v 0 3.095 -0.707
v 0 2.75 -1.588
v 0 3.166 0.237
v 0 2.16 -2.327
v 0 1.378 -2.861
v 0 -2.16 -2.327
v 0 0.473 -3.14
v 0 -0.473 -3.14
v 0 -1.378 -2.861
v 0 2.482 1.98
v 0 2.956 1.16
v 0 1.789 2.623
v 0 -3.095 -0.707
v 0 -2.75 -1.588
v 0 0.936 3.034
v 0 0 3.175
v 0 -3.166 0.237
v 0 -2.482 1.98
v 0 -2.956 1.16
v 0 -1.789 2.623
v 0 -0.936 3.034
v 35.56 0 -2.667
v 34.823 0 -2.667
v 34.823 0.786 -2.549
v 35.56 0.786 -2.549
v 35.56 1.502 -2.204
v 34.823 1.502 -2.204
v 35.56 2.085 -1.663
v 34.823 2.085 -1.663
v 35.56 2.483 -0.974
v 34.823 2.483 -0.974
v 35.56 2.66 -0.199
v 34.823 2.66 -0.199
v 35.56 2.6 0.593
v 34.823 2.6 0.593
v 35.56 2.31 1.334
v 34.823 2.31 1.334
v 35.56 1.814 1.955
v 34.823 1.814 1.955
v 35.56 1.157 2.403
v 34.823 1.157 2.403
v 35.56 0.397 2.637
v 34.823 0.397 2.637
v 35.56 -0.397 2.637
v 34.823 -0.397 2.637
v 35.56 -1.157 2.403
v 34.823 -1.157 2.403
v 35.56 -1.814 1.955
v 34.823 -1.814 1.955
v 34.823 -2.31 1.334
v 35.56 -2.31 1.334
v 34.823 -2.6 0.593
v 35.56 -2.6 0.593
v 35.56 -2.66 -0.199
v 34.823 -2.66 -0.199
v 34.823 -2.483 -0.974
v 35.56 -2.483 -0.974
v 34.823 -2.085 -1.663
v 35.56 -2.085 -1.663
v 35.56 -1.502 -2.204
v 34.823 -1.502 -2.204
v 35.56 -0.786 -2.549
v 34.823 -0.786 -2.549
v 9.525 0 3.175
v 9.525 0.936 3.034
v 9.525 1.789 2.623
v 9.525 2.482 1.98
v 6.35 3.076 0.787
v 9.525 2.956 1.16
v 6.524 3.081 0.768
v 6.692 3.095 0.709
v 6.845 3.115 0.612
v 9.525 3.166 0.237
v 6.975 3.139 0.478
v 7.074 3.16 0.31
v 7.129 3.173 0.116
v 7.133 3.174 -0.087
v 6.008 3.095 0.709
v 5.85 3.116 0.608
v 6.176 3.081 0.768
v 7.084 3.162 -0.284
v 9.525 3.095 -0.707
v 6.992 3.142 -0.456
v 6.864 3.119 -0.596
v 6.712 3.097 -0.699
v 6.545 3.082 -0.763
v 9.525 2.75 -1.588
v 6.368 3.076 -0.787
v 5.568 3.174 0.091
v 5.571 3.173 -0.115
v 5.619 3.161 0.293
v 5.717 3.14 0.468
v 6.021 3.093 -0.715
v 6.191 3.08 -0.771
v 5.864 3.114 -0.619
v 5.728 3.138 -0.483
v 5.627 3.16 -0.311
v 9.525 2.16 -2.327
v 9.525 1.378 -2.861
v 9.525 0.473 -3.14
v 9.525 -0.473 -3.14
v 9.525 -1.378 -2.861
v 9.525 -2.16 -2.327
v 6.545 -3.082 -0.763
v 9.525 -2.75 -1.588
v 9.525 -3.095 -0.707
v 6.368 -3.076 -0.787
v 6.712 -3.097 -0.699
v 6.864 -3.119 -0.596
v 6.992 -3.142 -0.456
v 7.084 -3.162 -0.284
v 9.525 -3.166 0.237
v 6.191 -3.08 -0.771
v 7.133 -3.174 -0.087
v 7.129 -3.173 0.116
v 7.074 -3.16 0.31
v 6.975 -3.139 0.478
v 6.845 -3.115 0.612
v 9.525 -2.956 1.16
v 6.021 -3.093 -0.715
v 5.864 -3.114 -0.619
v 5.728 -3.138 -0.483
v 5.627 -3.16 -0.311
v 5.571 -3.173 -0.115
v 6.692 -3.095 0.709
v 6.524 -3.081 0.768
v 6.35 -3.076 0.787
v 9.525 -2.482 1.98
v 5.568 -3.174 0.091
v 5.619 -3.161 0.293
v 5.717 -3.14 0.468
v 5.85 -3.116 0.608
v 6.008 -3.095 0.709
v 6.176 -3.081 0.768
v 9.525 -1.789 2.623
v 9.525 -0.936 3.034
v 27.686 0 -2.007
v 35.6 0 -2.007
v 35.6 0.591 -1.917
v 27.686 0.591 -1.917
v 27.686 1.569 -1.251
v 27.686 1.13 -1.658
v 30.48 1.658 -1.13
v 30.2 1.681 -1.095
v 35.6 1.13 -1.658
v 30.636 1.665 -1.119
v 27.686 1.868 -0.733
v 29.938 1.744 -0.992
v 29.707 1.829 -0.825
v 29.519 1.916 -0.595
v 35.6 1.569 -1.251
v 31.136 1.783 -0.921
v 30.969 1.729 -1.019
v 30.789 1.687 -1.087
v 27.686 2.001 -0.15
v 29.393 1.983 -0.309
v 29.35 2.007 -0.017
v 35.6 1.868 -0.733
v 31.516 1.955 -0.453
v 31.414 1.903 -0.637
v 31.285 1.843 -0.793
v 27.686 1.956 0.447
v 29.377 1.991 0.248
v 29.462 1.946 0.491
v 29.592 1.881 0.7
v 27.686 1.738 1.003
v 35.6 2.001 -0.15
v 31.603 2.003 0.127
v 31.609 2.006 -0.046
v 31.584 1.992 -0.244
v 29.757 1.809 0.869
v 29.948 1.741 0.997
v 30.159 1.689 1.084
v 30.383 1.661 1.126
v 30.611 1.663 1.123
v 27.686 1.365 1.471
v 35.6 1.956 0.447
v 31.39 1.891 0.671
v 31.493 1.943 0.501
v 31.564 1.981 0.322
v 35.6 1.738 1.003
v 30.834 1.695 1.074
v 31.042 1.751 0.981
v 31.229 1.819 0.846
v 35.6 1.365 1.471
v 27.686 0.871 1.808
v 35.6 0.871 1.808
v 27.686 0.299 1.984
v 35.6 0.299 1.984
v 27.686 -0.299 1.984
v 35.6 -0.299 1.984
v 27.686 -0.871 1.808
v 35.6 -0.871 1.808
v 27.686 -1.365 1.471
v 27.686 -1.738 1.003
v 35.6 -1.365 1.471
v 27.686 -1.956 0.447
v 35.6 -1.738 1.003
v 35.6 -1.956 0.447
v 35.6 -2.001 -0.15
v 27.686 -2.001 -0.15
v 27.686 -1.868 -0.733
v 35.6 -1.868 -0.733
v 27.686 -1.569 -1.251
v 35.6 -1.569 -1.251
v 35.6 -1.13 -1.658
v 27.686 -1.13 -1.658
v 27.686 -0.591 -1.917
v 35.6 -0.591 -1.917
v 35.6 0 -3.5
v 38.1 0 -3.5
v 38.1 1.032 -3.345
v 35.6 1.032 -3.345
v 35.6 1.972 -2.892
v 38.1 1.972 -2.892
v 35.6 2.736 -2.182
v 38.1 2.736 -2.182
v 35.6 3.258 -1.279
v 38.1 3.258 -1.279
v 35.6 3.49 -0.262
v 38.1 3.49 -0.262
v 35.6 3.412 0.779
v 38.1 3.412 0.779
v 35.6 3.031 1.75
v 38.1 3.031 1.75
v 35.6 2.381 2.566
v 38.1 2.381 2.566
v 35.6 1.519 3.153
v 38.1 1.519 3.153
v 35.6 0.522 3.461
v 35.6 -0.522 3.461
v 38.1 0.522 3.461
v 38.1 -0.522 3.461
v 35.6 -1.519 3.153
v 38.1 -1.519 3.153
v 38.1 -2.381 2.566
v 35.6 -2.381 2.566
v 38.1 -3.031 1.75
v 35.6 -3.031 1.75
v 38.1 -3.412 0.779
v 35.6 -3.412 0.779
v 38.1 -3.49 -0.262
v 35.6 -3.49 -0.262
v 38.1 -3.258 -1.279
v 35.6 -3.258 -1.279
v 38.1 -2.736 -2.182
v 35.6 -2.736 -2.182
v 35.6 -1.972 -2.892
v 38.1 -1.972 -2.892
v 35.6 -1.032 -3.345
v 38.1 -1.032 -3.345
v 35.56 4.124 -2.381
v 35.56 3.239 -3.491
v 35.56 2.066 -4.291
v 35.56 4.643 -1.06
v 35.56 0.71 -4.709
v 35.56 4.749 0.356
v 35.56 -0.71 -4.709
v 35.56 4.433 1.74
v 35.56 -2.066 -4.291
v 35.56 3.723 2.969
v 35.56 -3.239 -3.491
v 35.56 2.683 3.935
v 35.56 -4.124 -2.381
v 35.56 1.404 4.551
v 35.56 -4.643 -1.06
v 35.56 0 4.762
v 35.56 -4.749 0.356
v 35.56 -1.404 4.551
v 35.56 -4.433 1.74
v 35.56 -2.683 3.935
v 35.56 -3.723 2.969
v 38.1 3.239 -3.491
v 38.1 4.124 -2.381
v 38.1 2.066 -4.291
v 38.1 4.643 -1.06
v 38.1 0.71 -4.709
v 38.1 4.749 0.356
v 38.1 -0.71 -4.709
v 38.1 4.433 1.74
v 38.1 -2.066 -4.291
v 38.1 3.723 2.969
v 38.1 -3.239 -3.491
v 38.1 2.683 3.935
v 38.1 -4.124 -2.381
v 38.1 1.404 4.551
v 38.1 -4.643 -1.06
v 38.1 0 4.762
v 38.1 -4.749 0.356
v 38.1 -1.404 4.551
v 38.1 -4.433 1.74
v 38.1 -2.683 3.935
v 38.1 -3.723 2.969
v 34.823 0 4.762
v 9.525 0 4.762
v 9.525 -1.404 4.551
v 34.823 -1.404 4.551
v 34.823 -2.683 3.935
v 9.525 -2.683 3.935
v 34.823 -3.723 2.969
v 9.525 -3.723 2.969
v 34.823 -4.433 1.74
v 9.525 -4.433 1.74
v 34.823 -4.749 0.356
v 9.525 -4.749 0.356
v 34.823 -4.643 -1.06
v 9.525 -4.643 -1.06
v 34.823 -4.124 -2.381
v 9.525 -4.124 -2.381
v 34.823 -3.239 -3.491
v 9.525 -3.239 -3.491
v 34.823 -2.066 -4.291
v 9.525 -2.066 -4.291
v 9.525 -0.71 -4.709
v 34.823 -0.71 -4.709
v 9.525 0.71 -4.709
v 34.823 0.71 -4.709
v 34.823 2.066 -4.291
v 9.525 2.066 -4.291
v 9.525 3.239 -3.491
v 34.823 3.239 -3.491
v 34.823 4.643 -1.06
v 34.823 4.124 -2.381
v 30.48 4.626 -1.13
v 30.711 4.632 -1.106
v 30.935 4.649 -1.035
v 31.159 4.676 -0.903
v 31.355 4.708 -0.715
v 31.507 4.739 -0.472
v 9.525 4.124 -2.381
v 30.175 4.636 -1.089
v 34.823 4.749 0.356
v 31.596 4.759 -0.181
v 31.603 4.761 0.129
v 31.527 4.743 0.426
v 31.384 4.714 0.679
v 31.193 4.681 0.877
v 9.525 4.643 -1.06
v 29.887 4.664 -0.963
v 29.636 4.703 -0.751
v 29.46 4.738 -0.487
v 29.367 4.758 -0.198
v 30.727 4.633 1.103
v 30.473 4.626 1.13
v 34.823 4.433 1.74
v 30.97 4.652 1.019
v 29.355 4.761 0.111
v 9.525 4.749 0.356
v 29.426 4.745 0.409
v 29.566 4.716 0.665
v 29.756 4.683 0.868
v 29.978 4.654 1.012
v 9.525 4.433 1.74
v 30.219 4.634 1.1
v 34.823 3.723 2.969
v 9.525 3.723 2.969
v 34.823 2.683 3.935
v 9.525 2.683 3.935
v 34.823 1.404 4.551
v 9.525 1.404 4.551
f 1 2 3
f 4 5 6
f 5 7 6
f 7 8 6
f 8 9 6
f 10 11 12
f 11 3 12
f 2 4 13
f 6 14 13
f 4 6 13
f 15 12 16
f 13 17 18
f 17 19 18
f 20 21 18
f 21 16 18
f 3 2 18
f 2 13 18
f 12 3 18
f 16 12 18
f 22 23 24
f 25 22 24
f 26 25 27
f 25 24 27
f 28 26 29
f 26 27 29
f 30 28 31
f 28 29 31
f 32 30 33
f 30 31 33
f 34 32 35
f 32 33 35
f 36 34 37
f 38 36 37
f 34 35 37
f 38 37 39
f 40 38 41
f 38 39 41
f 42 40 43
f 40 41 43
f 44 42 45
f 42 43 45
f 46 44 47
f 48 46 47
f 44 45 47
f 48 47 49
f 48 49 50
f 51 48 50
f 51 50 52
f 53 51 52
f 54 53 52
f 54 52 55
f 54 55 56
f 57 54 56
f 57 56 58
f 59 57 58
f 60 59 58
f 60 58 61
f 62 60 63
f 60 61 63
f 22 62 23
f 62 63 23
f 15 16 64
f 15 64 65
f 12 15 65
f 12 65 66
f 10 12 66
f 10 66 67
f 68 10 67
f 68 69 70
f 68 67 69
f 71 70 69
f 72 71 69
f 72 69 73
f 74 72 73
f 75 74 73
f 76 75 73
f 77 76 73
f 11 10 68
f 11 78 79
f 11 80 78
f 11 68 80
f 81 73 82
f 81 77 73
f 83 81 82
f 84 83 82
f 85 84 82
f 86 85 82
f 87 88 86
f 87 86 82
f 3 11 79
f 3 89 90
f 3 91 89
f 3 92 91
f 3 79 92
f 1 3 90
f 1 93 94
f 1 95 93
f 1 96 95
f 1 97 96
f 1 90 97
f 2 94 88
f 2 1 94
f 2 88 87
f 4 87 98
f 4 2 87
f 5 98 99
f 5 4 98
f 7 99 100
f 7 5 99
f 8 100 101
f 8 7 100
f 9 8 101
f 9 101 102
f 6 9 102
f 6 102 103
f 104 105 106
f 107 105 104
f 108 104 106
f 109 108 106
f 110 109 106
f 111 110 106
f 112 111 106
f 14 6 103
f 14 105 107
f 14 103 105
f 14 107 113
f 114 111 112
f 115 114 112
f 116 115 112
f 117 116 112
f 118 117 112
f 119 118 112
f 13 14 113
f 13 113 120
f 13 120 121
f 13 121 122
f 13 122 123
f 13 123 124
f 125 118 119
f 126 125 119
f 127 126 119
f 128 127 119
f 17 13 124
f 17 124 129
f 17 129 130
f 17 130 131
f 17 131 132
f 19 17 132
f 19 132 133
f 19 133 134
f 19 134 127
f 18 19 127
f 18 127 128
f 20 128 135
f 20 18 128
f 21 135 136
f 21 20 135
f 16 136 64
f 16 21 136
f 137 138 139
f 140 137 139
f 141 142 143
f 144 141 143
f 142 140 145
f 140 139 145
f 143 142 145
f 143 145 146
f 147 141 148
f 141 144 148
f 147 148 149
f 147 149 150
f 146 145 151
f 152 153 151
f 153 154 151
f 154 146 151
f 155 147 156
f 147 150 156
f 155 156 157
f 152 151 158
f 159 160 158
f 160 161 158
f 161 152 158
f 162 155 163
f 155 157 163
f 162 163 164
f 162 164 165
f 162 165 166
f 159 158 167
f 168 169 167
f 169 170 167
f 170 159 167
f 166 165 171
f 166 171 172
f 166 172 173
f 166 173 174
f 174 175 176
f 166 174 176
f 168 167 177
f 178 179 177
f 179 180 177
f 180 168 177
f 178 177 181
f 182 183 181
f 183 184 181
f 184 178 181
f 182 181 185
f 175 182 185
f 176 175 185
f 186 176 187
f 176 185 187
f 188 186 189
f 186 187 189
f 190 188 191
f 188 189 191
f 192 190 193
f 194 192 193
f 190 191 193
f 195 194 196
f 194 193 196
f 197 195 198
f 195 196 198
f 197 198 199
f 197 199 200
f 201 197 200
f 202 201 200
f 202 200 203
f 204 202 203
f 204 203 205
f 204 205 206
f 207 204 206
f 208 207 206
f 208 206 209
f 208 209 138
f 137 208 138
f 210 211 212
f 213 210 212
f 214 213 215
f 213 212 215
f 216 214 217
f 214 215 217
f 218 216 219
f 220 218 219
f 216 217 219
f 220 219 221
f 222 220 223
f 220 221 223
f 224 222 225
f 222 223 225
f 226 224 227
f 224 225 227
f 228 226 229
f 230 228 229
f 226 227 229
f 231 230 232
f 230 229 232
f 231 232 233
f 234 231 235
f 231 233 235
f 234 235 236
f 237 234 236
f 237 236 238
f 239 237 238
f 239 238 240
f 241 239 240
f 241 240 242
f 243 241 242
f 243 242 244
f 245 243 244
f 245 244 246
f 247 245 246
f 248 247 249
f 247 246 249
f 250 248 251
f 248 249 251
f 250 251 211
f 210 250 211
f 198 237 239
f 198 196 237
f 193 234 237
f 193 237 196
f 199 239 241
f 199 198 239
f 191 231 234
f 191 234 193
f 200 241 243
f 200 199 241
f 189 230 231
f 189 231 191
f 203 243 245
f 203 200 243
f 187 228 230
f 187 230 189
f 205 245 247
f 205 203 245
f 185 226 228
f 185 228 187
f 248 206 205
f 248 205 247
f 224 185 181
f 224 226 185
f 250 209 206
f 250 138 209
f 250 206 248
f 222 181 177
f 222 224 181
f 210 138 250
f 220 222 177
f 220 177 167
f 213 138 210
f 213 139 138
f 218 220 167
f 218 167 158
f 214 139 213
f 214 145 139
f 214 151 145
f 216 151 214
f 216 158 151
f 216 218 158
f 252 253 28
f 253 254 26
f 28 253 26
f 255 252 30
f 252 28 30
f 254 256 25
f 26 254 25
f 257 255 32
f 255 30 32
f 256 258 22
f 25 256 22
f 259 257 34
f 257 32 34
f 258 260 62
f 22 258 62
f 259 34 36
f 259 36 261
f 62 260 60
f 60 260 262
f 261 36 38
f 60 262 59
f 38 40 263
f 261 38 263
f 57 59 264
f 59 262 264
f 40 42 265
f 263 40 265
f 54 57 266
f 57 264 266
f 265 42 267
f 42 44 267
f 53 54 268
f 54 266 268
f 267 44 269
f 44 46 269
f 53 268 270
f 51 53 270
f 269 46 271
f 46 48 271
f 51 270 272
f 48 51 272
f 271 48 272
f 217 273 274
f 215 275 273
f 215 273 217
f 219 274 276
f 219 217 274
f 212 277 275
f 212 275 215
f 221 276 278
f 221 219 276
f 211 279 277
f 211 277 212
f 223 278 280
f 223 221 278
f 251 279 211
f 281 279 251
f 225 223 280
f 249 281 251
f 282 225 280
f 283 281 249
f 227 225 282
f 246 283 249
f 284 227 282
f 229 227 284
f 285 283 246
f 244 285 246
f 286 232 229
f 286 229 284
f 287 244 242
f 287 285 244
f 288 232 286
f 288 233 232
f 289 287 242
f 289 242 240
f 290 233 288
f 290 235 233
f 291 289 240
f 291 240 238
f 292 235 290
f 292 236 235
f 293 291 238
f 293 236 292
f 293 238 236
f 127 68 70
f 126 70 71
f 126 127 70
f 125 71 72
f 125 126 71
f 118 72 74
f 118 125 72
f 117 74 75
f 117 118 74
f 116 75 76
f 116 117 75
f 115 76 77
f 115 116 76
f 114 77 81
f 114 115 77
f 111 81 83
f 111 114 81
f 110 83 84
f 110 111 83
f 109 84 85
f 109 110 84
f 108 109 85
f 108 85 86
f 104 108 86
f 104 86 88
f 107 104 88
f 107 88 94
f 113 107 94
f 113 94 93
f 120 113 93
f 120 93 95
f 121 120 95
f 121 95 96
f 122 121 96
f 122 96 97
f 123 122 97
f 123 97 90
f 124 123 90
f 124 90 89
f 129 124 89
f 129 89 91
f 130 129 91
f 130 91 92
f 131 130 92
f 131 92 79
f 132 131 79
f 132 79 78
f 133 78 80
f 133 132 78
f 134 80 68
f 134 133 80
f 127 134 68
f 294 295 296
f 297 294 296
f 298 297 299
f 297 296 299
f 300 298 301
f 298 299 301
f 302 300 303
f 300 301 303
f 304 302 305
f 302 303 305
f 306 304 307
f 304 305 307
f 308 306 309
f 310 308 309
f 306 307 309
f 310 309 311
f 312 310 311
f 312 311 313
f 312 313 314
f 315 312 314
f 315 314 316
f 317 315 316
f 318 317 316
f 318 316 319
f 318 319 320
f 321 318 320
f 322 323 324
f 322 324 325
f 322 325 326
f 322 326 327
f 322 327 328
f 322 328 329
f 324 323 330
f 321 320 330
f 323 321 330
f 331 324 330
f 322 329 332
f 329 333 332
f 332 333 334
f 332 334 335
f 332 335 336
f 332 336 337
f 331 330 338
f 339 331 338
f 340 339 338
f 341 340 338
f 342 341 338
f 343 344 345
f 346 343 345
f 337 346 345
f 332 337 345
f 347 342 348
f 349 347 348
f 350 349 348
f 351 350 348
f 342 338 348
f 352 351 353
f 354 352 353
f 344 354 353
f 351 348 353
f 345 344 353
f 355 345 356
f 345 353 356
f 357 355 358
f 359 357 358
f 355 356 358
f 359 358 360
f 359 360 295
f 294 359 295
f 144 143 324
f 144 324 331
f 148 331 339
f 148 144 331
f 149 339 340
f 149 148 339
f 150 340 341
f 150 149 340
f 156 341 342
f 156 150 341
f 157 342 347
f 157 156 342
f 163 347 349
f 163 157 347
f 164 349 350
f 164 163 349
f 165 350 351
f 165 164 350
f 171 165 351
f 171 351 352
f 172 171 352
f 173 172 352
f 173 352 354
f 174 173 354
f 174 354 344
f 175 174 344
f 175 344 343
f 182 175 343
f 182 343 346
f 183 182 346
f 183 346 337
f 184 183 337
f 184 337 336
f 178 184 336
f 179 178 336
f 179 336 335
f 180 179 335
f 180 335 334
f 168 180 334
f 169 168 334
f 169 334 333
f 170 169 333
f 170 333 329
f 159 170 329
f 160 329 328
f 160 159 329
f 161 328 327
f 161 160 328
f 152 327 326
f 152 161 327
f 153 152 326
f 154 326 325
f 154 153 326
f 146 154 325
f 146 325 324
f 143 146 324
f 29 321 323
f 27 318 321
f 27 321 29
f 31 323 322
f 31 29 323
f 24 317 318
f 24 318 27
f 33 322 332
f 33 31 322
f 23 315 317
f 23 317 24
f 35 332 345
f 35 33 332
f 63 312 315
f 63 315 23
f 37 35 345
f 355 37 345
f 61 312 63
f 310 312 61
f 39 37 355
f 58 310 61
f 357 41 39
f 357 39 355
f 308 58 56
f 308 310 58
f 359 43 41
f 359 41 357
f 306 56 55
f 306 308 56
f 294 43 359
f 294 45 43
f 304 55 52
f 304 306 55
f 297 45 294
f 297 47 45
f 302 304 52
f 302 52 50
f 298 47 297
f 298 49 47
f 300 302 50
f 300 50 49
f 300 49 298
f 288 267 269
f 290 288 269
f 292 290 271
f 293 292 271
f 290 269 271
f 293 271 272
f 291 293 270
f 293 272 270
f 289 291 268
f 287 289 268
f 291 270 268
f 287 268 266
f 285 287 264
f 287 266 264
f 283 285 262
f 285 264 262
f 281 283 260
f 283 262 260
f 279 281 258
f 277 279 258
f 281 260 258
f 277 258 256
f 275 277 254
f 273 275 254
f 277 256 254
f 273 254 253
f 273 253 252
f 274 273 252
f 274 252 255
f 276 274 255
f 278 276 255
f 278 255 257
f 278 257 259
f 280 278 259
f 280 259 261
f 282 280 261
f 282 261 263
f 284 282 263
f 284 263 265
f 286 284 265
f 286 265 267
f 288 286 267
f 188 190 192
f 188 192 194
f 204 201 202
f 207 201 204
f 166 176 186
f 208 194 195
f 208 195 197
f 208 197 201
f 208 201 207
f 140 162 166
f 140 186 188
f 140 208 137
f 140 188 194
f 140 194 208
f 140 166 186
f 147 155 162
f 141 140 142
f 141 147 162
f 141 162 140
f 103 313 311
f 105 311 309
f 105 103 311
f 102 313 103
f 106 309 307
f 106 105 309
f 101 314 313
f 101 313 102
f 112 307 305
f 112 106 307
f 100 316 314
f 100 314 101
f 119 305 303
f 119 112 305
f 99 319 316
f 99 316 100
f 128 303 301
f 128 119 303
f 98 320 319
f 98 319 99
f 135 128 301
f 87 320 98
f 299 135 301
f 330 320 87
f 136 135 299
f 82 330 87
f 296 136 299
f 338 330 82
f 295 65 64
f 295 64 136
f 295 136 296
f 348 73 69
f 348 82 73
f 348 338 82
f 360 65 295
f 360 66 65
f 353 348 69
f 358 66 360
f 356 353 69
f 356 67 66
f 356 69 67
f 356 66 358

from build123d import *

# Parameters (mm, degrees)
SKETCH1_R               = 4.7625
BOSS_EXTRUDE1_DEPTH     = 38.1
SKETCH2_R               = 2.0066
CUT_EXTRUDE1_DEPTH      = 10.414
SKETCH3_R               = 1.1303
CUT_EXTRUDE2_DEPTH      = 8.6868
SKETCH4_R               = 5.084796601
SKETCH4_R_2             = 3.175
CUT_EXTRUDE3_DEPTH      = 9.525
CUT_EXTRUDE4_DEPTH      = 39.690733028
CUT_EXTRUDE4_DEPTH_BACK = 39.690733028
SKETCH5_R               = 0.7874
SKETCH6_R               = 3.5000057
CUT_EXTRUDE5_DEPTH      = 2.50000008
CUT_EXTRUDE7_START      = -0.7366
SKETCH7_R               = 4.7625
SKETCH7_R_2             = 2.667
CUT_EXTRUDE7_DEPTH      = 0.7366


with BuildPart() as part:
    # Sketch1 → Boss-Extrude1 (new body)
    with BuildSketch(Plane(origin=(0, 0, 0), x_dir=(0, 0, -1), z_dir=(1, 0, 0))):
        with Locations(Location((0, 0, 0), (0, 0, 180))):
            Circle(SKETCH1_R)
    extrude(amount=BOSS_EXTRUDE1_DEPTH)

    # Sketch2 → Cut-Extrude1 (cut)
    with BuildSketch(Plane(origin=(38.1, 0, 0), x_dir=(0, 0, -1), z_dir=(1, 0, 0))):
        Circle(SKETCH2_R)
    extrude(amount=-CUT_EXTRUDE1_DEPTH, mode=Mode.SUBTRACT)

    # Sketch3 → Cut-Extrude2 (cut)
    with BuildSketch(Plane(origin=(0, 0, 0), x_dir=(1, 0, 0), z_dir=(0, 1, 0))):
        with Locations(Location((30.48, 0, 0), (0, 0, 90))):
            Circle(SKETCH3_R)
    extrude(amount=CUT_EXTRUDE2_DEPTH, mode=Mode.SUBTRACT)

    # Sketch4 → Cut-Extrude3 (cut)
    with BuildSketch(Plane.ZY):
        Circle(SKETCH4_R)
        Circle(SKETCH4_R_2, mode=Mode.SUBTRACT)
    extrude(amount=-CUT_EXTRUDE3_DEPTH, mode=Mode.SUBTRACT)

    # Sketch5 → Cut-Extrude4 (cut, two sides: drawn at the far end of the back side and taken through both)
    with BuildSketch(Plane(origin=(0, 0, 0), x_dir=(1, 0, 0), z_dir=(0, 1, 0)).offset(-CUT_EXTRUDE4_DEPTH_BACK)):
        with Locations(Location((6.35, 0, 0), (0, 0, 270))):
            Circle(SKETCH5_R)
    extrude(amount=CUT_EXTRUDE4_DEPTH + CUT_EXTRUDE4_DEPTH_BACK, mode=Mode.SUBTRACT)

    # Sketch6 → Cut-Extrude5 (cut)
    with BuildSketch(Plane(origin=(38.1, 0, 0), x_dir=(0, 0, -1), z_dir=(1, 0, 0))):
        Circle(SKETCH6_R)
    extrude(amount=-CUT_EXTRUDE5_DEPTH, mode=Mode.SUBTRACT)

    # Sketch7 → Cut-Extrude7 (cut)
    with BuildSketch(Plane(origin=(35.56, 0, 0), x_dir=(0, 0, -1), z_dir=(1, 0, 0)).offset(CUT_EXTRUDE7_START)):
        with Locations(Location((0, 0, 0), (0, 0, 180))):
            Circle(SKETCH7_R)
        Circle(SKETCH7_R_2, mode=Mode.SUBTRACT)
    extrude(amount=CUT_EXTRUDE7_DEPTH, mode=Mode.SUBTRACT)


solid = part.part
